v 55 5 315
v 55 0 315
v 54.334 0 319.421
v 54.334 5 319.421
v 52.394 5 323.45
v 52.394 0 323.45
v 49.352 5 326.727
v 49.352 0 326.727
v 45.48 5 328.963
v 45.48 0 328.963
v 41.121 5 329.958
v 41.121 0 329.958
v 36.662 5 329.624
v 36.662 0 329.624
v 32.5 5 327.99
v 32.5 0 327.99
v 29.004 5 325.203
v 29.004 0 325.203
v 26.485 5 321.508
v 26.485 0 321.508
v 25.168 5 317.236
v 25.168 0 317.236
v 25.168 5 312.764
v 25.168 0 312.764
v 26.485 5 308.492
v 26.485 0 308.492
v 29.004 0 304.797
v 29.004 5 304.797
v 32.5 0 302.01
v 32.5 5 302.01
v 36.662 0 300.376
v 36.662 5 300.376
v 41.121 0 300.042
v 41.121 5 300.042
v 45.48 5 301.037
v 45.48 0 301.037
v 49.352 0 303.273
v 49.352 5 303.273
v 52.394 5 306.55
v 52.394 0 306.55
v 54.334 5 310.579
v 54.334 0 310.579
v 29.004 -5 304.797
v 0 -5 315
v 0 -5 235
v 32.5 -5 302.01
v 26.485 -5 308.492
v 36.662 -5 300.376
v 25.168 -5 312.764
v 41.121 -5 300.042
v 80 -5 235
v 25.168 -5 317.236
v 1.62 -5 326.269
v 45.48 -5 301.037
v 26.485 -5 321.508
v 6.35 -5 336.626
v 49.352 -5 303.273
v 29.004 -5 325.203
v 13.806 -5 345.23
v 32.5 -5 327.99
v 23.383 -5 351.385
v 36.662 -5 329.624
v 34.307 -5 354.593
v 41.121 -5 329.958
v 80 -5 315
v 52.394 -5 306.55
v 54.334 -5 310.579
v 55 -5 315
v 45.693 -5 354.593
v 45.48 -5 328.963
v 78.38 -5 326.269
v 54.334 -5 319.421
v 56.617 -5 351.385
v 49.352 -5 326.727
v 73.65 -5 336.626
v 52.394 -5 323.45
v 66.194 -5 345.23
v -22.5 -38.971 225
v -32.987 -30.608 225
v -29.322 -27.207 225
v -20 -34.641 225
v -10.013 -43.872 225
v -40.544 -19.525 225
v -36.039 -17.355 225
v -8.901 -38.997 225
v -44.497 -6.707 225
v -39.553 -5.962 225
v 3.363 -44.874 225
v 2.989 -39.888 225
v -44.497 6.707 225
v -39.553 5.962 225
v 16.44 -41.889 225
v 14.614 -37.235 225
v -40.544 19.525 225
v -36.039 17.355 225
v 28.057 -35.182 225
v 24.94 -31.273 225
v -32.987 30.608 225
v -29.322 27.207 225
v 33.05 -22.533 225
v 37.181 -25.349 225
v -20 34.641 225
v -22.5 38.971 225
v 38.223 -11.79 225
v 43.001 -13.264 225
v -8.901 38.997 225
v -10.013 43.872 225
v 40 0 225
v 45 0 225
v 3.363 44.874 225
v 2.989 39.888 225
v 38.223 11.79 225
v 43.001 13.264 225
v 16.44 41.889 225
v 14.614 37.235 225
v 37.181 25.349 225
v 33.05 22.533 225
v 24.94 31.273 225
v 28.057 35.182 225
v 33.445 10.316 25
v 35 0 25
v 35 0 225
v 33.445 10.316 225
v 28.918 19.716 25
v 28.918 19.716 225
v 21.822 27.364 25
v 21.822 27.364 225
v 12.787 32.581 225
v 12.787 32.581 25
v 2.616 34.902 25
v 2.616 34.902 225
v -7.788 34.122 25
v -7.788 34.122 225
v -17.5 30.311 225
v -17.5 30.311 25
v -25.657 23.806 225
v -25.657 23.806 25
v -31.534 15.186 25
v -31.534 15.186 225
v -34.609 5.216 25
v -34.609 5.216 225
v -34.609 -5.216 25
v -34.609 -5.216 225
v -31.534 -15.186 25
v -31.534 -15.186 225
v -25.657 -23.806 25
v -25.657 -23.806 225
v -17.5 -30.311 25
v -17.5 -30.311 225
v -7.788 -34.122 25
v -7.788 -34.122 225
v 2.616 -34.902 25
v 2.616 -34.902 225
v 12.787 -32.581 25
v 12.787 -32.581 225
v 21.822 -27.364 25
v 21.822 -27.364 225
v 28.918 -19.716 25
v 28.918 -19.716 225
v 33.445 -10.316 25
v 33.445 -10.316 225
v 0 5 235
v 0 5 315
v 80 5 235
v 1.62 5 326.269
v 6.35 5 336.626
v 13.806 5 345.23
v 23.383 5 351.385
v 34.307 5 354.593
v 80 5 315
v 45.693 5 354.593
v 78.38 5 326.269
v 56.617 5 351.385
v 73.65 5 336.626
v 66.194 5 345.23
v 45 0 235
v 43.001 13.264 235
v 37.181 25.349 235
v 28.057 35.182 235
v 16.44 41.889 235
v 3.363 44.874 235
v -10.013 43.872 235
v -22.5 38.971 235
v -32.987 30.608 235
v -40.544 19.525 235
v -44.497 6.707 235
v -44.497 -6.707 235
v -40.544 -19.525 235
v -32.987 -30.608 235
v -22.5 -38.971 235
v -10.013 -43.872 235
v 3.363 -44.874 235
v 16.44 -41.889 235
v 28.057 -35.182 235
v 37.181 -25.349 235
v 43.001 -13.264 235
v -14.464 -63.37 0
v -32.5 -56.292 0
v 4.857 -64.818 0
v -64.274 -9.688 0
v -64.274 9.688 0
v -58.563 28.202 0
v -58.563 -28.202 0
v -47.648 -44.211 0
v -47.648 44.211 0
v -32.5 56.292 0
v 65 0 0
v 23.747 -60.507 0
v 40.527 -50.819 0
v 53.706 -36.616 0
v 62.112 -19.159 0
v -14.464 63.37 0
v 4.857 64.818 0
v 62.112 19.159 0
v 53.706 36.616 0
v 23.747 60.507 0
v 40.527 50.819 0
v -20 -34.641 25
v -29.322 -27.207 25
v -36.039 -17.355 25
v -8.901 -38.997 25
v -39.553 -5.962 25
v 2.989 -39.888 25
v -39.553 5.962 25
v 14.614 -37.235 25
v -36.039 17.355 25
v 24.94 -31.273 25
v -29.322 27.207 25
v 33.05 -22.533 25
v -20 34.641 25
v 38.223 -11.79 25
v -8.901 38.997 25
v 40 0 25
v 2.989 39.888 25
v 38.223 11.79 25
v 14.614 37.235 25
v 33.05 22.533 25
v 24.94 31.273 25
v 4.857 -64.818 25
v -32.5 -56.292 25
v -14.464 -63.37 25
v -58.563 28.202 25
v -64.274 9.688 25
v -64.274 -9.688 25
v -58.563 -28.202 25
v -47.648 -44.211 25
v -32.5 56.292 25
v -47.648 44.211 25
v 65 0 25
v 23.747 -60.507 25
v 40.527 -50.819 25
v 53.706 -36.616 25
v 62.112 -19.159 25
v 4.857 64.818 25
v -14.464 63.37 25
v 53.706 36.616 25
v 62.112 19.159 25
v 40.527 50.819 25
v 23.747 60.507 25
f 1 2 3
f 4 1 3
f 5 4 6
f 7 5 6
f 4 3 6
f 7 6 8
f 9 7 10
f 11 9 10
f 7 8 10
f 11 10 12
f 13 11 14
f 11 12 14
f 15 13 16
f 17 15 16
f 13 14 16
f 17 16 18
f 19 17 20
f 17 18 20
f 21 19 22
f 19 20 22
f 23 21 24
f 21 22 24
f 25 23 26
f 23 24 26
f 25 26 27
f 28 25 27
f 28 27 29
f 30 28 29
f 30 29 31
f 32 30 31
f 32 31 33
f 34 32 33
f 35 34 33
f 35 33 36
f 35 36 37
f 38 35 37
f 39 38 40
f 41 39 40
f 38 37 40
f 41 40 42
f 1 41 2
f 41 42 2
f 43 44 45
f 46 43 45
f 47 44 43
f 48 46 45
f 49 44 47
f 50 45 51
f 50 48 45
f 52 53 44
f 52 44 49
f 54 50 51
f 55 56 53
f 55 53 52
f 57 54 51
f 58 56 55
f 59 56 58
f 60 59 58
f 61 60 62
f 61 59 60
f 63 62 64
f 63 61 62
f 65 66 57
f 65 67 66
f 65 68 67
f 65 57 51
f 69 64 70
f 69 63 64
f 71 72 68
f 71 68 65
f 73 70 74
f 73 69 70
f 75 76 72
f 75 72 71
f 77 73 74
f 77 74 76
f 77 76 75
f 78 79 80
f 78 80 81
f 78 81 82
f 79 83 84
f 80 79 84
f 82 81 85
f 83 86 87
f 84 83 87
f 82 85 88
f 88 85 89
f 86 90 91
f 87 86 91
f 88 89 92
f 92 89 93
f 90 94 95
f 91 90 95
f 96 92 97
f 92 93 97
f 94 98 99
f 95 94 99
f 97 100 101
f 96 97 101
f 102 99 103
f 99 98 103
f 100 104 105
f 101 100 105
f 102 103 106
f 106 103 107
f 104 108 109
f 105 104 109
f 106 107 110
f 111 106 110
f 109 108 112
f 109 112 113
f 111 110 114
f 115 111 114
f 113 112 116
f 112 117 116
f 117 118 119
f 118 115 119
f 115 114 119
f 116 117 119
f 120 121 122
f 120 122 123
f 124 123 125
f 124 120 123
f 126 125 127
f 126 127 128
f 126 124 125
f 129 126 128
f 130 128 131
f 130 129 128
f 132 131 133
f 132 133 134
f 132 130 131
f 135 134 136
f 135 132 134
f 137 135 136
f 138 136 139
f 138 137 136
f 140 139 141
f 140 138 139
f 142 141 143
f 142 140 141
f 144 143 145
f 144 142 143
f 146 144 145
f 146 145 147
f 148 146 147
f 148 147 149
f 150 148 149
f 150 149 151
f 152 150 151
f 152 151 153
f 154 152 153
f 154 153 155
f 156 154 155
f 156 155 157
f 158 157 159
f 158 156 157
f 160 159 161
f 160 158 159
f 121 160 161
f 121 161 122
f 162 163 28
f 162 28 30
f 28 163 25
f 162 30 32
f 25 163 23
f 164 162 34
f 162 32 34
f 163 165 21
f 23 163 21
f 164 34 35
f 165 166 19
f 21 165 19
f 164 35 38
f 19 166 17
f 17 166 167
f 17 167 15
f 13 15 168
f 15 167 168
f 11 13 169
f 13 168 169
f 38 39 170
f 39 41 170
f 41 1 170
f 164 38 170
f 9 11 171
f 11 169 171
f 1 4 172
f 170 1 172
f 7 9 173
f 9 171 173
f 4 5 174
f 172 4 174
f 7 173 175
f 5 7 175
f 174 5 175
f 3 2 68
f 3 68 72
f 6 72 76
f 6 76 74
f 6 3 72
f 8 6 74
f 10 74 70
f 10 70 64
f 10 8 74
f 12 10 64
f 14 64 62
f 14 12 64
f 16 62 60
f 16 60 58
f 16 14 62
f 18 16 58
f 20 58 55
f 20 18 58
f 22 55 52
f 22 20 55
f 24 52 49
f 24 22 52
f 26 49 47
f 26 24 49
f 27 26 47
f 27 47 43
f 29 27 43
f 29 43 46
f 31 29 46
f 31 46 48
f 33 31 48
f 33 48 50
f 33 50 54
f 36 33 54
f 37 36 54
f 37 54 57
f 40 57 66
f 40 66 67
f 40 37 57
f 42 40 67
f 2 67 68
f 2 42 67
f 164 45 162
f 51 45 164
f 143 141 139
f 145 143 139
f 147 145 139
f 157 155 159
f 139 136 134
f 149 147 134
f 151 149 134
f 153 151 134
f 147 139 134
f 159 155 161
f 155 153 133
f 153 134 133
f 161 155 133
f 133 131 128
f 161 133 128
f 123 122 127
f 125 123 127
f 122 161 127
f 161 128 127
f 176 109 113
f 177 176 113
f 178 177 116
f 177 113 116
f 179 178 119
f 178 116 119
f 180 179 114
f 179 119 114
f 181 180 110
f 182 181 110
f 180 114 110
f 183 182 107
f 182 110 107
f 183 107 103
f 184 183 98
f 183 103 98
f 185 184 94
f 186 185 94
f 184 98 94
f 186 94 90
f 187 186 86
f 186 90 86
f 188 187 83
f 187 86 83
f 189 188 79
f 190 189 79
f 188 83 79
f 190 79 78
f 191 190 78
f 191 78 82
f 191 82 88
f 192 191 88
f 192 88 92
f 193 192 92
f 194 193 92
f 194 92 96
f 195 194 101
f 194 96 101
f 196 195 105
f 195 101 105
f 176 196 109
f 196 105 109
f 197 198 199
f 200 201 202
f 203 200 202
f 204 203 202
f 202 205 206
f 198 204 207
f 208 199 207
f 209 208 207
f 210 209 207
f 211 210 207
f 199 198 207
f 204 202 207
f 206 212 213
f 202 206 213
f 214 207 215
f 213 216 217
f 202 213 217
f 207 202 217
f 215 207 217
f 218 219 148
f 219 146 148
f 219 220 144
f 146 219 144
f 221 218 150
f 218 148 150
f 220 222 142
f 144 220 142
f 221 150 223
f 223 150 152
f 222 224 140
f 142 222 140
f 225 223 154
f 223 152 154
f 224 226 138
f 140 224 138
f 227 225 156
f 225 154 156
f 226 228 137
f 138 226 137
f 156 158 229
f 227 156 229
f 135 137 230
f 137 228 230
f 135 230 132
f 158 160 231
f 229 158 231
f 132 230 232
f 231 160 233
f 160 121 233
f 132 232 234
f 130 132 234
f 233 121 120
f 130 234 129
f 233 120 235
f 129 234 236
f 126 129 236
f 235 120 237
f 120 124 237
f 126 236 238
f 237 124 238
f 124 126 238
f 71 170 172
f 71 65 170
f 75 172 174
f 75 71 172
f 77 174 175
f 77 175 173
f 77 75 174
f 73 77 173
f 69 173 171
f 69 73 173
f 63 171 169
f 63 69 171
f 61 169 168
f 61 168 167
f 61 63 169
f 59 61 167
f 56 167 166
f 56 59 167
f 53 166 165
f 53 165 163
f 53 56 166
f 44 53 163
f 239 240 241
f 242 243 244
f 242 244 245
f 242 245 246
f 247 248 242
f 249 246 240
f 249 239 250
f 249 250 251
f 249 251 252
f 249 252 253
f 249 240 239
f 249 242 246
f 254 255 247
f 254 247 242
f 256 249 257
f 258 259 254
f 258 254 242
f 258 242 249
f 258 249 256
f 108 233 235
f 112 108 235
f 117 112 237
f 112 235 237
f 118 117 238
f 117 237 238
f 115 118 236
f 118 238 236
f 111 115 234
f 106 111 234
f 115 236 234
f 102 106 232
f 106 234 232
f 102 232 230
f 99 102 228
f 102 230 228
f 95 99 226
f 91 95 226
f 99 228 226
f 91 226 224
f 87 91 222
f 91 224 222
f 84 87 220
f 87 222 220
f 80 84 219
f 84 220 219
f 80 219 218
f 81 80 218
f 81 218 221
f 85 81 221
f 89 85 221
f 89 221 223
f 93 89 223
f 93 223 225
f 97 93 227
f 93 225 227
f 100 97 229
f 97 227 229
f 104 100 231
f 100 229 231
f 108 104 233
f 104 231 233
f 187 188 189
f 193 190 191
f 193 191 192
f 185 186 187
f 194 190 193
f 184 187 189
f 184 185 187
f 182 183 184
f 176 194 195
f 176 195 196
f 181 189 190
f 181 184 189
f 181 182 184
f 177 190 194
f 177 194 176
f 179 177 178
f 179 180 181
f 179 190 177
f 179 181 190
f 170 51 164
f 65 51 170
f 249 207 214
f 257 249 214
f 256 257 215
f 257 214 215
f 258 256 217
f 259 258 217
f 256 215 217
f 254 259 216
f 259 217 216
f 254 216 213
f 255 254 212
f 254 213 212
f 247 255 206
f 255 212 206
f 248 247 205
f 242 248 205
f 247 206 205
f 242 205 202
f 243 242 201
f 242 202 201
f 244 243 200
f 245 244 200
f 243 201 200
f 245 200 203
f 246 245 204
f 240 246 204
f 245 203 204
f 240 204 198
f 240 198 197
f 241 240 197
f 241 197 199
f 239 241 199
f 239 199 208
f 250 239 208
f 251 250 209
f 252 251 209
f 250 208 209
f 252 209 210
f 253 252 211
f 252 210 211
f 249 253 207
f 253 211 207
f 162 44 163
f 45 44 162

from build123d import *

# Parameters (mm, degrees)
F0_R          = 65
F1_DEPTH      = 25
F2_R          = 40
F2_R_2        = 35
F3_DEPTH      = 200
F4_R          = 45
F5_DEPTH      = 10
F6_R          = 15
F7_DEPTH      = 5
F7_DEPTH_BACK = 5


with BuildPart() as f1:
    # F0 (on Top) → F1 (new body)
    with BuildSketch(Plane.XY):
        Circle(F0_R)
    extrude(amount=F1_DEPTH)


with BuildPart() as f3:
    # F2 (on face) → F3 (new body)
    with BuildSketch(Plane.XY.offset(25)):
        Circle(F2_R)
        Circle(F2_R_2, mode=Mode.SUBTRACT)
    extrude(amount=F3_DEPTH)

    # F4 (on face) → F5 (join)
    with BuildSketch(Plane.XY.offset(225)):
        Circle(F4_R)
    extrude(amount=F5_DEPTH)


with BuildPart() as f7:
    # F6 (on Front) → F7 (new body, two sides)
    with BuildSketch(Plane.XZ) as f7_sk:
        with BuildLine():
            Line((0, 315), (0, 235))
            Line((0, 235), (80, 235))
            Line((80, 235), (80, 315))
            ThreePointArc((80, 315), (40, 355), (0, 315))
        make_face()
        with Locations((40, 315)):
            Circle(F6_R, mode=Mode.SUBTRACT)
    extrude(amount=F7_DEPTH)
    extrude(f7_sk.sketch, amount=-F7_DEPTH_BACK)


solid = Compound([f1.part, f3.part, f7.part])
